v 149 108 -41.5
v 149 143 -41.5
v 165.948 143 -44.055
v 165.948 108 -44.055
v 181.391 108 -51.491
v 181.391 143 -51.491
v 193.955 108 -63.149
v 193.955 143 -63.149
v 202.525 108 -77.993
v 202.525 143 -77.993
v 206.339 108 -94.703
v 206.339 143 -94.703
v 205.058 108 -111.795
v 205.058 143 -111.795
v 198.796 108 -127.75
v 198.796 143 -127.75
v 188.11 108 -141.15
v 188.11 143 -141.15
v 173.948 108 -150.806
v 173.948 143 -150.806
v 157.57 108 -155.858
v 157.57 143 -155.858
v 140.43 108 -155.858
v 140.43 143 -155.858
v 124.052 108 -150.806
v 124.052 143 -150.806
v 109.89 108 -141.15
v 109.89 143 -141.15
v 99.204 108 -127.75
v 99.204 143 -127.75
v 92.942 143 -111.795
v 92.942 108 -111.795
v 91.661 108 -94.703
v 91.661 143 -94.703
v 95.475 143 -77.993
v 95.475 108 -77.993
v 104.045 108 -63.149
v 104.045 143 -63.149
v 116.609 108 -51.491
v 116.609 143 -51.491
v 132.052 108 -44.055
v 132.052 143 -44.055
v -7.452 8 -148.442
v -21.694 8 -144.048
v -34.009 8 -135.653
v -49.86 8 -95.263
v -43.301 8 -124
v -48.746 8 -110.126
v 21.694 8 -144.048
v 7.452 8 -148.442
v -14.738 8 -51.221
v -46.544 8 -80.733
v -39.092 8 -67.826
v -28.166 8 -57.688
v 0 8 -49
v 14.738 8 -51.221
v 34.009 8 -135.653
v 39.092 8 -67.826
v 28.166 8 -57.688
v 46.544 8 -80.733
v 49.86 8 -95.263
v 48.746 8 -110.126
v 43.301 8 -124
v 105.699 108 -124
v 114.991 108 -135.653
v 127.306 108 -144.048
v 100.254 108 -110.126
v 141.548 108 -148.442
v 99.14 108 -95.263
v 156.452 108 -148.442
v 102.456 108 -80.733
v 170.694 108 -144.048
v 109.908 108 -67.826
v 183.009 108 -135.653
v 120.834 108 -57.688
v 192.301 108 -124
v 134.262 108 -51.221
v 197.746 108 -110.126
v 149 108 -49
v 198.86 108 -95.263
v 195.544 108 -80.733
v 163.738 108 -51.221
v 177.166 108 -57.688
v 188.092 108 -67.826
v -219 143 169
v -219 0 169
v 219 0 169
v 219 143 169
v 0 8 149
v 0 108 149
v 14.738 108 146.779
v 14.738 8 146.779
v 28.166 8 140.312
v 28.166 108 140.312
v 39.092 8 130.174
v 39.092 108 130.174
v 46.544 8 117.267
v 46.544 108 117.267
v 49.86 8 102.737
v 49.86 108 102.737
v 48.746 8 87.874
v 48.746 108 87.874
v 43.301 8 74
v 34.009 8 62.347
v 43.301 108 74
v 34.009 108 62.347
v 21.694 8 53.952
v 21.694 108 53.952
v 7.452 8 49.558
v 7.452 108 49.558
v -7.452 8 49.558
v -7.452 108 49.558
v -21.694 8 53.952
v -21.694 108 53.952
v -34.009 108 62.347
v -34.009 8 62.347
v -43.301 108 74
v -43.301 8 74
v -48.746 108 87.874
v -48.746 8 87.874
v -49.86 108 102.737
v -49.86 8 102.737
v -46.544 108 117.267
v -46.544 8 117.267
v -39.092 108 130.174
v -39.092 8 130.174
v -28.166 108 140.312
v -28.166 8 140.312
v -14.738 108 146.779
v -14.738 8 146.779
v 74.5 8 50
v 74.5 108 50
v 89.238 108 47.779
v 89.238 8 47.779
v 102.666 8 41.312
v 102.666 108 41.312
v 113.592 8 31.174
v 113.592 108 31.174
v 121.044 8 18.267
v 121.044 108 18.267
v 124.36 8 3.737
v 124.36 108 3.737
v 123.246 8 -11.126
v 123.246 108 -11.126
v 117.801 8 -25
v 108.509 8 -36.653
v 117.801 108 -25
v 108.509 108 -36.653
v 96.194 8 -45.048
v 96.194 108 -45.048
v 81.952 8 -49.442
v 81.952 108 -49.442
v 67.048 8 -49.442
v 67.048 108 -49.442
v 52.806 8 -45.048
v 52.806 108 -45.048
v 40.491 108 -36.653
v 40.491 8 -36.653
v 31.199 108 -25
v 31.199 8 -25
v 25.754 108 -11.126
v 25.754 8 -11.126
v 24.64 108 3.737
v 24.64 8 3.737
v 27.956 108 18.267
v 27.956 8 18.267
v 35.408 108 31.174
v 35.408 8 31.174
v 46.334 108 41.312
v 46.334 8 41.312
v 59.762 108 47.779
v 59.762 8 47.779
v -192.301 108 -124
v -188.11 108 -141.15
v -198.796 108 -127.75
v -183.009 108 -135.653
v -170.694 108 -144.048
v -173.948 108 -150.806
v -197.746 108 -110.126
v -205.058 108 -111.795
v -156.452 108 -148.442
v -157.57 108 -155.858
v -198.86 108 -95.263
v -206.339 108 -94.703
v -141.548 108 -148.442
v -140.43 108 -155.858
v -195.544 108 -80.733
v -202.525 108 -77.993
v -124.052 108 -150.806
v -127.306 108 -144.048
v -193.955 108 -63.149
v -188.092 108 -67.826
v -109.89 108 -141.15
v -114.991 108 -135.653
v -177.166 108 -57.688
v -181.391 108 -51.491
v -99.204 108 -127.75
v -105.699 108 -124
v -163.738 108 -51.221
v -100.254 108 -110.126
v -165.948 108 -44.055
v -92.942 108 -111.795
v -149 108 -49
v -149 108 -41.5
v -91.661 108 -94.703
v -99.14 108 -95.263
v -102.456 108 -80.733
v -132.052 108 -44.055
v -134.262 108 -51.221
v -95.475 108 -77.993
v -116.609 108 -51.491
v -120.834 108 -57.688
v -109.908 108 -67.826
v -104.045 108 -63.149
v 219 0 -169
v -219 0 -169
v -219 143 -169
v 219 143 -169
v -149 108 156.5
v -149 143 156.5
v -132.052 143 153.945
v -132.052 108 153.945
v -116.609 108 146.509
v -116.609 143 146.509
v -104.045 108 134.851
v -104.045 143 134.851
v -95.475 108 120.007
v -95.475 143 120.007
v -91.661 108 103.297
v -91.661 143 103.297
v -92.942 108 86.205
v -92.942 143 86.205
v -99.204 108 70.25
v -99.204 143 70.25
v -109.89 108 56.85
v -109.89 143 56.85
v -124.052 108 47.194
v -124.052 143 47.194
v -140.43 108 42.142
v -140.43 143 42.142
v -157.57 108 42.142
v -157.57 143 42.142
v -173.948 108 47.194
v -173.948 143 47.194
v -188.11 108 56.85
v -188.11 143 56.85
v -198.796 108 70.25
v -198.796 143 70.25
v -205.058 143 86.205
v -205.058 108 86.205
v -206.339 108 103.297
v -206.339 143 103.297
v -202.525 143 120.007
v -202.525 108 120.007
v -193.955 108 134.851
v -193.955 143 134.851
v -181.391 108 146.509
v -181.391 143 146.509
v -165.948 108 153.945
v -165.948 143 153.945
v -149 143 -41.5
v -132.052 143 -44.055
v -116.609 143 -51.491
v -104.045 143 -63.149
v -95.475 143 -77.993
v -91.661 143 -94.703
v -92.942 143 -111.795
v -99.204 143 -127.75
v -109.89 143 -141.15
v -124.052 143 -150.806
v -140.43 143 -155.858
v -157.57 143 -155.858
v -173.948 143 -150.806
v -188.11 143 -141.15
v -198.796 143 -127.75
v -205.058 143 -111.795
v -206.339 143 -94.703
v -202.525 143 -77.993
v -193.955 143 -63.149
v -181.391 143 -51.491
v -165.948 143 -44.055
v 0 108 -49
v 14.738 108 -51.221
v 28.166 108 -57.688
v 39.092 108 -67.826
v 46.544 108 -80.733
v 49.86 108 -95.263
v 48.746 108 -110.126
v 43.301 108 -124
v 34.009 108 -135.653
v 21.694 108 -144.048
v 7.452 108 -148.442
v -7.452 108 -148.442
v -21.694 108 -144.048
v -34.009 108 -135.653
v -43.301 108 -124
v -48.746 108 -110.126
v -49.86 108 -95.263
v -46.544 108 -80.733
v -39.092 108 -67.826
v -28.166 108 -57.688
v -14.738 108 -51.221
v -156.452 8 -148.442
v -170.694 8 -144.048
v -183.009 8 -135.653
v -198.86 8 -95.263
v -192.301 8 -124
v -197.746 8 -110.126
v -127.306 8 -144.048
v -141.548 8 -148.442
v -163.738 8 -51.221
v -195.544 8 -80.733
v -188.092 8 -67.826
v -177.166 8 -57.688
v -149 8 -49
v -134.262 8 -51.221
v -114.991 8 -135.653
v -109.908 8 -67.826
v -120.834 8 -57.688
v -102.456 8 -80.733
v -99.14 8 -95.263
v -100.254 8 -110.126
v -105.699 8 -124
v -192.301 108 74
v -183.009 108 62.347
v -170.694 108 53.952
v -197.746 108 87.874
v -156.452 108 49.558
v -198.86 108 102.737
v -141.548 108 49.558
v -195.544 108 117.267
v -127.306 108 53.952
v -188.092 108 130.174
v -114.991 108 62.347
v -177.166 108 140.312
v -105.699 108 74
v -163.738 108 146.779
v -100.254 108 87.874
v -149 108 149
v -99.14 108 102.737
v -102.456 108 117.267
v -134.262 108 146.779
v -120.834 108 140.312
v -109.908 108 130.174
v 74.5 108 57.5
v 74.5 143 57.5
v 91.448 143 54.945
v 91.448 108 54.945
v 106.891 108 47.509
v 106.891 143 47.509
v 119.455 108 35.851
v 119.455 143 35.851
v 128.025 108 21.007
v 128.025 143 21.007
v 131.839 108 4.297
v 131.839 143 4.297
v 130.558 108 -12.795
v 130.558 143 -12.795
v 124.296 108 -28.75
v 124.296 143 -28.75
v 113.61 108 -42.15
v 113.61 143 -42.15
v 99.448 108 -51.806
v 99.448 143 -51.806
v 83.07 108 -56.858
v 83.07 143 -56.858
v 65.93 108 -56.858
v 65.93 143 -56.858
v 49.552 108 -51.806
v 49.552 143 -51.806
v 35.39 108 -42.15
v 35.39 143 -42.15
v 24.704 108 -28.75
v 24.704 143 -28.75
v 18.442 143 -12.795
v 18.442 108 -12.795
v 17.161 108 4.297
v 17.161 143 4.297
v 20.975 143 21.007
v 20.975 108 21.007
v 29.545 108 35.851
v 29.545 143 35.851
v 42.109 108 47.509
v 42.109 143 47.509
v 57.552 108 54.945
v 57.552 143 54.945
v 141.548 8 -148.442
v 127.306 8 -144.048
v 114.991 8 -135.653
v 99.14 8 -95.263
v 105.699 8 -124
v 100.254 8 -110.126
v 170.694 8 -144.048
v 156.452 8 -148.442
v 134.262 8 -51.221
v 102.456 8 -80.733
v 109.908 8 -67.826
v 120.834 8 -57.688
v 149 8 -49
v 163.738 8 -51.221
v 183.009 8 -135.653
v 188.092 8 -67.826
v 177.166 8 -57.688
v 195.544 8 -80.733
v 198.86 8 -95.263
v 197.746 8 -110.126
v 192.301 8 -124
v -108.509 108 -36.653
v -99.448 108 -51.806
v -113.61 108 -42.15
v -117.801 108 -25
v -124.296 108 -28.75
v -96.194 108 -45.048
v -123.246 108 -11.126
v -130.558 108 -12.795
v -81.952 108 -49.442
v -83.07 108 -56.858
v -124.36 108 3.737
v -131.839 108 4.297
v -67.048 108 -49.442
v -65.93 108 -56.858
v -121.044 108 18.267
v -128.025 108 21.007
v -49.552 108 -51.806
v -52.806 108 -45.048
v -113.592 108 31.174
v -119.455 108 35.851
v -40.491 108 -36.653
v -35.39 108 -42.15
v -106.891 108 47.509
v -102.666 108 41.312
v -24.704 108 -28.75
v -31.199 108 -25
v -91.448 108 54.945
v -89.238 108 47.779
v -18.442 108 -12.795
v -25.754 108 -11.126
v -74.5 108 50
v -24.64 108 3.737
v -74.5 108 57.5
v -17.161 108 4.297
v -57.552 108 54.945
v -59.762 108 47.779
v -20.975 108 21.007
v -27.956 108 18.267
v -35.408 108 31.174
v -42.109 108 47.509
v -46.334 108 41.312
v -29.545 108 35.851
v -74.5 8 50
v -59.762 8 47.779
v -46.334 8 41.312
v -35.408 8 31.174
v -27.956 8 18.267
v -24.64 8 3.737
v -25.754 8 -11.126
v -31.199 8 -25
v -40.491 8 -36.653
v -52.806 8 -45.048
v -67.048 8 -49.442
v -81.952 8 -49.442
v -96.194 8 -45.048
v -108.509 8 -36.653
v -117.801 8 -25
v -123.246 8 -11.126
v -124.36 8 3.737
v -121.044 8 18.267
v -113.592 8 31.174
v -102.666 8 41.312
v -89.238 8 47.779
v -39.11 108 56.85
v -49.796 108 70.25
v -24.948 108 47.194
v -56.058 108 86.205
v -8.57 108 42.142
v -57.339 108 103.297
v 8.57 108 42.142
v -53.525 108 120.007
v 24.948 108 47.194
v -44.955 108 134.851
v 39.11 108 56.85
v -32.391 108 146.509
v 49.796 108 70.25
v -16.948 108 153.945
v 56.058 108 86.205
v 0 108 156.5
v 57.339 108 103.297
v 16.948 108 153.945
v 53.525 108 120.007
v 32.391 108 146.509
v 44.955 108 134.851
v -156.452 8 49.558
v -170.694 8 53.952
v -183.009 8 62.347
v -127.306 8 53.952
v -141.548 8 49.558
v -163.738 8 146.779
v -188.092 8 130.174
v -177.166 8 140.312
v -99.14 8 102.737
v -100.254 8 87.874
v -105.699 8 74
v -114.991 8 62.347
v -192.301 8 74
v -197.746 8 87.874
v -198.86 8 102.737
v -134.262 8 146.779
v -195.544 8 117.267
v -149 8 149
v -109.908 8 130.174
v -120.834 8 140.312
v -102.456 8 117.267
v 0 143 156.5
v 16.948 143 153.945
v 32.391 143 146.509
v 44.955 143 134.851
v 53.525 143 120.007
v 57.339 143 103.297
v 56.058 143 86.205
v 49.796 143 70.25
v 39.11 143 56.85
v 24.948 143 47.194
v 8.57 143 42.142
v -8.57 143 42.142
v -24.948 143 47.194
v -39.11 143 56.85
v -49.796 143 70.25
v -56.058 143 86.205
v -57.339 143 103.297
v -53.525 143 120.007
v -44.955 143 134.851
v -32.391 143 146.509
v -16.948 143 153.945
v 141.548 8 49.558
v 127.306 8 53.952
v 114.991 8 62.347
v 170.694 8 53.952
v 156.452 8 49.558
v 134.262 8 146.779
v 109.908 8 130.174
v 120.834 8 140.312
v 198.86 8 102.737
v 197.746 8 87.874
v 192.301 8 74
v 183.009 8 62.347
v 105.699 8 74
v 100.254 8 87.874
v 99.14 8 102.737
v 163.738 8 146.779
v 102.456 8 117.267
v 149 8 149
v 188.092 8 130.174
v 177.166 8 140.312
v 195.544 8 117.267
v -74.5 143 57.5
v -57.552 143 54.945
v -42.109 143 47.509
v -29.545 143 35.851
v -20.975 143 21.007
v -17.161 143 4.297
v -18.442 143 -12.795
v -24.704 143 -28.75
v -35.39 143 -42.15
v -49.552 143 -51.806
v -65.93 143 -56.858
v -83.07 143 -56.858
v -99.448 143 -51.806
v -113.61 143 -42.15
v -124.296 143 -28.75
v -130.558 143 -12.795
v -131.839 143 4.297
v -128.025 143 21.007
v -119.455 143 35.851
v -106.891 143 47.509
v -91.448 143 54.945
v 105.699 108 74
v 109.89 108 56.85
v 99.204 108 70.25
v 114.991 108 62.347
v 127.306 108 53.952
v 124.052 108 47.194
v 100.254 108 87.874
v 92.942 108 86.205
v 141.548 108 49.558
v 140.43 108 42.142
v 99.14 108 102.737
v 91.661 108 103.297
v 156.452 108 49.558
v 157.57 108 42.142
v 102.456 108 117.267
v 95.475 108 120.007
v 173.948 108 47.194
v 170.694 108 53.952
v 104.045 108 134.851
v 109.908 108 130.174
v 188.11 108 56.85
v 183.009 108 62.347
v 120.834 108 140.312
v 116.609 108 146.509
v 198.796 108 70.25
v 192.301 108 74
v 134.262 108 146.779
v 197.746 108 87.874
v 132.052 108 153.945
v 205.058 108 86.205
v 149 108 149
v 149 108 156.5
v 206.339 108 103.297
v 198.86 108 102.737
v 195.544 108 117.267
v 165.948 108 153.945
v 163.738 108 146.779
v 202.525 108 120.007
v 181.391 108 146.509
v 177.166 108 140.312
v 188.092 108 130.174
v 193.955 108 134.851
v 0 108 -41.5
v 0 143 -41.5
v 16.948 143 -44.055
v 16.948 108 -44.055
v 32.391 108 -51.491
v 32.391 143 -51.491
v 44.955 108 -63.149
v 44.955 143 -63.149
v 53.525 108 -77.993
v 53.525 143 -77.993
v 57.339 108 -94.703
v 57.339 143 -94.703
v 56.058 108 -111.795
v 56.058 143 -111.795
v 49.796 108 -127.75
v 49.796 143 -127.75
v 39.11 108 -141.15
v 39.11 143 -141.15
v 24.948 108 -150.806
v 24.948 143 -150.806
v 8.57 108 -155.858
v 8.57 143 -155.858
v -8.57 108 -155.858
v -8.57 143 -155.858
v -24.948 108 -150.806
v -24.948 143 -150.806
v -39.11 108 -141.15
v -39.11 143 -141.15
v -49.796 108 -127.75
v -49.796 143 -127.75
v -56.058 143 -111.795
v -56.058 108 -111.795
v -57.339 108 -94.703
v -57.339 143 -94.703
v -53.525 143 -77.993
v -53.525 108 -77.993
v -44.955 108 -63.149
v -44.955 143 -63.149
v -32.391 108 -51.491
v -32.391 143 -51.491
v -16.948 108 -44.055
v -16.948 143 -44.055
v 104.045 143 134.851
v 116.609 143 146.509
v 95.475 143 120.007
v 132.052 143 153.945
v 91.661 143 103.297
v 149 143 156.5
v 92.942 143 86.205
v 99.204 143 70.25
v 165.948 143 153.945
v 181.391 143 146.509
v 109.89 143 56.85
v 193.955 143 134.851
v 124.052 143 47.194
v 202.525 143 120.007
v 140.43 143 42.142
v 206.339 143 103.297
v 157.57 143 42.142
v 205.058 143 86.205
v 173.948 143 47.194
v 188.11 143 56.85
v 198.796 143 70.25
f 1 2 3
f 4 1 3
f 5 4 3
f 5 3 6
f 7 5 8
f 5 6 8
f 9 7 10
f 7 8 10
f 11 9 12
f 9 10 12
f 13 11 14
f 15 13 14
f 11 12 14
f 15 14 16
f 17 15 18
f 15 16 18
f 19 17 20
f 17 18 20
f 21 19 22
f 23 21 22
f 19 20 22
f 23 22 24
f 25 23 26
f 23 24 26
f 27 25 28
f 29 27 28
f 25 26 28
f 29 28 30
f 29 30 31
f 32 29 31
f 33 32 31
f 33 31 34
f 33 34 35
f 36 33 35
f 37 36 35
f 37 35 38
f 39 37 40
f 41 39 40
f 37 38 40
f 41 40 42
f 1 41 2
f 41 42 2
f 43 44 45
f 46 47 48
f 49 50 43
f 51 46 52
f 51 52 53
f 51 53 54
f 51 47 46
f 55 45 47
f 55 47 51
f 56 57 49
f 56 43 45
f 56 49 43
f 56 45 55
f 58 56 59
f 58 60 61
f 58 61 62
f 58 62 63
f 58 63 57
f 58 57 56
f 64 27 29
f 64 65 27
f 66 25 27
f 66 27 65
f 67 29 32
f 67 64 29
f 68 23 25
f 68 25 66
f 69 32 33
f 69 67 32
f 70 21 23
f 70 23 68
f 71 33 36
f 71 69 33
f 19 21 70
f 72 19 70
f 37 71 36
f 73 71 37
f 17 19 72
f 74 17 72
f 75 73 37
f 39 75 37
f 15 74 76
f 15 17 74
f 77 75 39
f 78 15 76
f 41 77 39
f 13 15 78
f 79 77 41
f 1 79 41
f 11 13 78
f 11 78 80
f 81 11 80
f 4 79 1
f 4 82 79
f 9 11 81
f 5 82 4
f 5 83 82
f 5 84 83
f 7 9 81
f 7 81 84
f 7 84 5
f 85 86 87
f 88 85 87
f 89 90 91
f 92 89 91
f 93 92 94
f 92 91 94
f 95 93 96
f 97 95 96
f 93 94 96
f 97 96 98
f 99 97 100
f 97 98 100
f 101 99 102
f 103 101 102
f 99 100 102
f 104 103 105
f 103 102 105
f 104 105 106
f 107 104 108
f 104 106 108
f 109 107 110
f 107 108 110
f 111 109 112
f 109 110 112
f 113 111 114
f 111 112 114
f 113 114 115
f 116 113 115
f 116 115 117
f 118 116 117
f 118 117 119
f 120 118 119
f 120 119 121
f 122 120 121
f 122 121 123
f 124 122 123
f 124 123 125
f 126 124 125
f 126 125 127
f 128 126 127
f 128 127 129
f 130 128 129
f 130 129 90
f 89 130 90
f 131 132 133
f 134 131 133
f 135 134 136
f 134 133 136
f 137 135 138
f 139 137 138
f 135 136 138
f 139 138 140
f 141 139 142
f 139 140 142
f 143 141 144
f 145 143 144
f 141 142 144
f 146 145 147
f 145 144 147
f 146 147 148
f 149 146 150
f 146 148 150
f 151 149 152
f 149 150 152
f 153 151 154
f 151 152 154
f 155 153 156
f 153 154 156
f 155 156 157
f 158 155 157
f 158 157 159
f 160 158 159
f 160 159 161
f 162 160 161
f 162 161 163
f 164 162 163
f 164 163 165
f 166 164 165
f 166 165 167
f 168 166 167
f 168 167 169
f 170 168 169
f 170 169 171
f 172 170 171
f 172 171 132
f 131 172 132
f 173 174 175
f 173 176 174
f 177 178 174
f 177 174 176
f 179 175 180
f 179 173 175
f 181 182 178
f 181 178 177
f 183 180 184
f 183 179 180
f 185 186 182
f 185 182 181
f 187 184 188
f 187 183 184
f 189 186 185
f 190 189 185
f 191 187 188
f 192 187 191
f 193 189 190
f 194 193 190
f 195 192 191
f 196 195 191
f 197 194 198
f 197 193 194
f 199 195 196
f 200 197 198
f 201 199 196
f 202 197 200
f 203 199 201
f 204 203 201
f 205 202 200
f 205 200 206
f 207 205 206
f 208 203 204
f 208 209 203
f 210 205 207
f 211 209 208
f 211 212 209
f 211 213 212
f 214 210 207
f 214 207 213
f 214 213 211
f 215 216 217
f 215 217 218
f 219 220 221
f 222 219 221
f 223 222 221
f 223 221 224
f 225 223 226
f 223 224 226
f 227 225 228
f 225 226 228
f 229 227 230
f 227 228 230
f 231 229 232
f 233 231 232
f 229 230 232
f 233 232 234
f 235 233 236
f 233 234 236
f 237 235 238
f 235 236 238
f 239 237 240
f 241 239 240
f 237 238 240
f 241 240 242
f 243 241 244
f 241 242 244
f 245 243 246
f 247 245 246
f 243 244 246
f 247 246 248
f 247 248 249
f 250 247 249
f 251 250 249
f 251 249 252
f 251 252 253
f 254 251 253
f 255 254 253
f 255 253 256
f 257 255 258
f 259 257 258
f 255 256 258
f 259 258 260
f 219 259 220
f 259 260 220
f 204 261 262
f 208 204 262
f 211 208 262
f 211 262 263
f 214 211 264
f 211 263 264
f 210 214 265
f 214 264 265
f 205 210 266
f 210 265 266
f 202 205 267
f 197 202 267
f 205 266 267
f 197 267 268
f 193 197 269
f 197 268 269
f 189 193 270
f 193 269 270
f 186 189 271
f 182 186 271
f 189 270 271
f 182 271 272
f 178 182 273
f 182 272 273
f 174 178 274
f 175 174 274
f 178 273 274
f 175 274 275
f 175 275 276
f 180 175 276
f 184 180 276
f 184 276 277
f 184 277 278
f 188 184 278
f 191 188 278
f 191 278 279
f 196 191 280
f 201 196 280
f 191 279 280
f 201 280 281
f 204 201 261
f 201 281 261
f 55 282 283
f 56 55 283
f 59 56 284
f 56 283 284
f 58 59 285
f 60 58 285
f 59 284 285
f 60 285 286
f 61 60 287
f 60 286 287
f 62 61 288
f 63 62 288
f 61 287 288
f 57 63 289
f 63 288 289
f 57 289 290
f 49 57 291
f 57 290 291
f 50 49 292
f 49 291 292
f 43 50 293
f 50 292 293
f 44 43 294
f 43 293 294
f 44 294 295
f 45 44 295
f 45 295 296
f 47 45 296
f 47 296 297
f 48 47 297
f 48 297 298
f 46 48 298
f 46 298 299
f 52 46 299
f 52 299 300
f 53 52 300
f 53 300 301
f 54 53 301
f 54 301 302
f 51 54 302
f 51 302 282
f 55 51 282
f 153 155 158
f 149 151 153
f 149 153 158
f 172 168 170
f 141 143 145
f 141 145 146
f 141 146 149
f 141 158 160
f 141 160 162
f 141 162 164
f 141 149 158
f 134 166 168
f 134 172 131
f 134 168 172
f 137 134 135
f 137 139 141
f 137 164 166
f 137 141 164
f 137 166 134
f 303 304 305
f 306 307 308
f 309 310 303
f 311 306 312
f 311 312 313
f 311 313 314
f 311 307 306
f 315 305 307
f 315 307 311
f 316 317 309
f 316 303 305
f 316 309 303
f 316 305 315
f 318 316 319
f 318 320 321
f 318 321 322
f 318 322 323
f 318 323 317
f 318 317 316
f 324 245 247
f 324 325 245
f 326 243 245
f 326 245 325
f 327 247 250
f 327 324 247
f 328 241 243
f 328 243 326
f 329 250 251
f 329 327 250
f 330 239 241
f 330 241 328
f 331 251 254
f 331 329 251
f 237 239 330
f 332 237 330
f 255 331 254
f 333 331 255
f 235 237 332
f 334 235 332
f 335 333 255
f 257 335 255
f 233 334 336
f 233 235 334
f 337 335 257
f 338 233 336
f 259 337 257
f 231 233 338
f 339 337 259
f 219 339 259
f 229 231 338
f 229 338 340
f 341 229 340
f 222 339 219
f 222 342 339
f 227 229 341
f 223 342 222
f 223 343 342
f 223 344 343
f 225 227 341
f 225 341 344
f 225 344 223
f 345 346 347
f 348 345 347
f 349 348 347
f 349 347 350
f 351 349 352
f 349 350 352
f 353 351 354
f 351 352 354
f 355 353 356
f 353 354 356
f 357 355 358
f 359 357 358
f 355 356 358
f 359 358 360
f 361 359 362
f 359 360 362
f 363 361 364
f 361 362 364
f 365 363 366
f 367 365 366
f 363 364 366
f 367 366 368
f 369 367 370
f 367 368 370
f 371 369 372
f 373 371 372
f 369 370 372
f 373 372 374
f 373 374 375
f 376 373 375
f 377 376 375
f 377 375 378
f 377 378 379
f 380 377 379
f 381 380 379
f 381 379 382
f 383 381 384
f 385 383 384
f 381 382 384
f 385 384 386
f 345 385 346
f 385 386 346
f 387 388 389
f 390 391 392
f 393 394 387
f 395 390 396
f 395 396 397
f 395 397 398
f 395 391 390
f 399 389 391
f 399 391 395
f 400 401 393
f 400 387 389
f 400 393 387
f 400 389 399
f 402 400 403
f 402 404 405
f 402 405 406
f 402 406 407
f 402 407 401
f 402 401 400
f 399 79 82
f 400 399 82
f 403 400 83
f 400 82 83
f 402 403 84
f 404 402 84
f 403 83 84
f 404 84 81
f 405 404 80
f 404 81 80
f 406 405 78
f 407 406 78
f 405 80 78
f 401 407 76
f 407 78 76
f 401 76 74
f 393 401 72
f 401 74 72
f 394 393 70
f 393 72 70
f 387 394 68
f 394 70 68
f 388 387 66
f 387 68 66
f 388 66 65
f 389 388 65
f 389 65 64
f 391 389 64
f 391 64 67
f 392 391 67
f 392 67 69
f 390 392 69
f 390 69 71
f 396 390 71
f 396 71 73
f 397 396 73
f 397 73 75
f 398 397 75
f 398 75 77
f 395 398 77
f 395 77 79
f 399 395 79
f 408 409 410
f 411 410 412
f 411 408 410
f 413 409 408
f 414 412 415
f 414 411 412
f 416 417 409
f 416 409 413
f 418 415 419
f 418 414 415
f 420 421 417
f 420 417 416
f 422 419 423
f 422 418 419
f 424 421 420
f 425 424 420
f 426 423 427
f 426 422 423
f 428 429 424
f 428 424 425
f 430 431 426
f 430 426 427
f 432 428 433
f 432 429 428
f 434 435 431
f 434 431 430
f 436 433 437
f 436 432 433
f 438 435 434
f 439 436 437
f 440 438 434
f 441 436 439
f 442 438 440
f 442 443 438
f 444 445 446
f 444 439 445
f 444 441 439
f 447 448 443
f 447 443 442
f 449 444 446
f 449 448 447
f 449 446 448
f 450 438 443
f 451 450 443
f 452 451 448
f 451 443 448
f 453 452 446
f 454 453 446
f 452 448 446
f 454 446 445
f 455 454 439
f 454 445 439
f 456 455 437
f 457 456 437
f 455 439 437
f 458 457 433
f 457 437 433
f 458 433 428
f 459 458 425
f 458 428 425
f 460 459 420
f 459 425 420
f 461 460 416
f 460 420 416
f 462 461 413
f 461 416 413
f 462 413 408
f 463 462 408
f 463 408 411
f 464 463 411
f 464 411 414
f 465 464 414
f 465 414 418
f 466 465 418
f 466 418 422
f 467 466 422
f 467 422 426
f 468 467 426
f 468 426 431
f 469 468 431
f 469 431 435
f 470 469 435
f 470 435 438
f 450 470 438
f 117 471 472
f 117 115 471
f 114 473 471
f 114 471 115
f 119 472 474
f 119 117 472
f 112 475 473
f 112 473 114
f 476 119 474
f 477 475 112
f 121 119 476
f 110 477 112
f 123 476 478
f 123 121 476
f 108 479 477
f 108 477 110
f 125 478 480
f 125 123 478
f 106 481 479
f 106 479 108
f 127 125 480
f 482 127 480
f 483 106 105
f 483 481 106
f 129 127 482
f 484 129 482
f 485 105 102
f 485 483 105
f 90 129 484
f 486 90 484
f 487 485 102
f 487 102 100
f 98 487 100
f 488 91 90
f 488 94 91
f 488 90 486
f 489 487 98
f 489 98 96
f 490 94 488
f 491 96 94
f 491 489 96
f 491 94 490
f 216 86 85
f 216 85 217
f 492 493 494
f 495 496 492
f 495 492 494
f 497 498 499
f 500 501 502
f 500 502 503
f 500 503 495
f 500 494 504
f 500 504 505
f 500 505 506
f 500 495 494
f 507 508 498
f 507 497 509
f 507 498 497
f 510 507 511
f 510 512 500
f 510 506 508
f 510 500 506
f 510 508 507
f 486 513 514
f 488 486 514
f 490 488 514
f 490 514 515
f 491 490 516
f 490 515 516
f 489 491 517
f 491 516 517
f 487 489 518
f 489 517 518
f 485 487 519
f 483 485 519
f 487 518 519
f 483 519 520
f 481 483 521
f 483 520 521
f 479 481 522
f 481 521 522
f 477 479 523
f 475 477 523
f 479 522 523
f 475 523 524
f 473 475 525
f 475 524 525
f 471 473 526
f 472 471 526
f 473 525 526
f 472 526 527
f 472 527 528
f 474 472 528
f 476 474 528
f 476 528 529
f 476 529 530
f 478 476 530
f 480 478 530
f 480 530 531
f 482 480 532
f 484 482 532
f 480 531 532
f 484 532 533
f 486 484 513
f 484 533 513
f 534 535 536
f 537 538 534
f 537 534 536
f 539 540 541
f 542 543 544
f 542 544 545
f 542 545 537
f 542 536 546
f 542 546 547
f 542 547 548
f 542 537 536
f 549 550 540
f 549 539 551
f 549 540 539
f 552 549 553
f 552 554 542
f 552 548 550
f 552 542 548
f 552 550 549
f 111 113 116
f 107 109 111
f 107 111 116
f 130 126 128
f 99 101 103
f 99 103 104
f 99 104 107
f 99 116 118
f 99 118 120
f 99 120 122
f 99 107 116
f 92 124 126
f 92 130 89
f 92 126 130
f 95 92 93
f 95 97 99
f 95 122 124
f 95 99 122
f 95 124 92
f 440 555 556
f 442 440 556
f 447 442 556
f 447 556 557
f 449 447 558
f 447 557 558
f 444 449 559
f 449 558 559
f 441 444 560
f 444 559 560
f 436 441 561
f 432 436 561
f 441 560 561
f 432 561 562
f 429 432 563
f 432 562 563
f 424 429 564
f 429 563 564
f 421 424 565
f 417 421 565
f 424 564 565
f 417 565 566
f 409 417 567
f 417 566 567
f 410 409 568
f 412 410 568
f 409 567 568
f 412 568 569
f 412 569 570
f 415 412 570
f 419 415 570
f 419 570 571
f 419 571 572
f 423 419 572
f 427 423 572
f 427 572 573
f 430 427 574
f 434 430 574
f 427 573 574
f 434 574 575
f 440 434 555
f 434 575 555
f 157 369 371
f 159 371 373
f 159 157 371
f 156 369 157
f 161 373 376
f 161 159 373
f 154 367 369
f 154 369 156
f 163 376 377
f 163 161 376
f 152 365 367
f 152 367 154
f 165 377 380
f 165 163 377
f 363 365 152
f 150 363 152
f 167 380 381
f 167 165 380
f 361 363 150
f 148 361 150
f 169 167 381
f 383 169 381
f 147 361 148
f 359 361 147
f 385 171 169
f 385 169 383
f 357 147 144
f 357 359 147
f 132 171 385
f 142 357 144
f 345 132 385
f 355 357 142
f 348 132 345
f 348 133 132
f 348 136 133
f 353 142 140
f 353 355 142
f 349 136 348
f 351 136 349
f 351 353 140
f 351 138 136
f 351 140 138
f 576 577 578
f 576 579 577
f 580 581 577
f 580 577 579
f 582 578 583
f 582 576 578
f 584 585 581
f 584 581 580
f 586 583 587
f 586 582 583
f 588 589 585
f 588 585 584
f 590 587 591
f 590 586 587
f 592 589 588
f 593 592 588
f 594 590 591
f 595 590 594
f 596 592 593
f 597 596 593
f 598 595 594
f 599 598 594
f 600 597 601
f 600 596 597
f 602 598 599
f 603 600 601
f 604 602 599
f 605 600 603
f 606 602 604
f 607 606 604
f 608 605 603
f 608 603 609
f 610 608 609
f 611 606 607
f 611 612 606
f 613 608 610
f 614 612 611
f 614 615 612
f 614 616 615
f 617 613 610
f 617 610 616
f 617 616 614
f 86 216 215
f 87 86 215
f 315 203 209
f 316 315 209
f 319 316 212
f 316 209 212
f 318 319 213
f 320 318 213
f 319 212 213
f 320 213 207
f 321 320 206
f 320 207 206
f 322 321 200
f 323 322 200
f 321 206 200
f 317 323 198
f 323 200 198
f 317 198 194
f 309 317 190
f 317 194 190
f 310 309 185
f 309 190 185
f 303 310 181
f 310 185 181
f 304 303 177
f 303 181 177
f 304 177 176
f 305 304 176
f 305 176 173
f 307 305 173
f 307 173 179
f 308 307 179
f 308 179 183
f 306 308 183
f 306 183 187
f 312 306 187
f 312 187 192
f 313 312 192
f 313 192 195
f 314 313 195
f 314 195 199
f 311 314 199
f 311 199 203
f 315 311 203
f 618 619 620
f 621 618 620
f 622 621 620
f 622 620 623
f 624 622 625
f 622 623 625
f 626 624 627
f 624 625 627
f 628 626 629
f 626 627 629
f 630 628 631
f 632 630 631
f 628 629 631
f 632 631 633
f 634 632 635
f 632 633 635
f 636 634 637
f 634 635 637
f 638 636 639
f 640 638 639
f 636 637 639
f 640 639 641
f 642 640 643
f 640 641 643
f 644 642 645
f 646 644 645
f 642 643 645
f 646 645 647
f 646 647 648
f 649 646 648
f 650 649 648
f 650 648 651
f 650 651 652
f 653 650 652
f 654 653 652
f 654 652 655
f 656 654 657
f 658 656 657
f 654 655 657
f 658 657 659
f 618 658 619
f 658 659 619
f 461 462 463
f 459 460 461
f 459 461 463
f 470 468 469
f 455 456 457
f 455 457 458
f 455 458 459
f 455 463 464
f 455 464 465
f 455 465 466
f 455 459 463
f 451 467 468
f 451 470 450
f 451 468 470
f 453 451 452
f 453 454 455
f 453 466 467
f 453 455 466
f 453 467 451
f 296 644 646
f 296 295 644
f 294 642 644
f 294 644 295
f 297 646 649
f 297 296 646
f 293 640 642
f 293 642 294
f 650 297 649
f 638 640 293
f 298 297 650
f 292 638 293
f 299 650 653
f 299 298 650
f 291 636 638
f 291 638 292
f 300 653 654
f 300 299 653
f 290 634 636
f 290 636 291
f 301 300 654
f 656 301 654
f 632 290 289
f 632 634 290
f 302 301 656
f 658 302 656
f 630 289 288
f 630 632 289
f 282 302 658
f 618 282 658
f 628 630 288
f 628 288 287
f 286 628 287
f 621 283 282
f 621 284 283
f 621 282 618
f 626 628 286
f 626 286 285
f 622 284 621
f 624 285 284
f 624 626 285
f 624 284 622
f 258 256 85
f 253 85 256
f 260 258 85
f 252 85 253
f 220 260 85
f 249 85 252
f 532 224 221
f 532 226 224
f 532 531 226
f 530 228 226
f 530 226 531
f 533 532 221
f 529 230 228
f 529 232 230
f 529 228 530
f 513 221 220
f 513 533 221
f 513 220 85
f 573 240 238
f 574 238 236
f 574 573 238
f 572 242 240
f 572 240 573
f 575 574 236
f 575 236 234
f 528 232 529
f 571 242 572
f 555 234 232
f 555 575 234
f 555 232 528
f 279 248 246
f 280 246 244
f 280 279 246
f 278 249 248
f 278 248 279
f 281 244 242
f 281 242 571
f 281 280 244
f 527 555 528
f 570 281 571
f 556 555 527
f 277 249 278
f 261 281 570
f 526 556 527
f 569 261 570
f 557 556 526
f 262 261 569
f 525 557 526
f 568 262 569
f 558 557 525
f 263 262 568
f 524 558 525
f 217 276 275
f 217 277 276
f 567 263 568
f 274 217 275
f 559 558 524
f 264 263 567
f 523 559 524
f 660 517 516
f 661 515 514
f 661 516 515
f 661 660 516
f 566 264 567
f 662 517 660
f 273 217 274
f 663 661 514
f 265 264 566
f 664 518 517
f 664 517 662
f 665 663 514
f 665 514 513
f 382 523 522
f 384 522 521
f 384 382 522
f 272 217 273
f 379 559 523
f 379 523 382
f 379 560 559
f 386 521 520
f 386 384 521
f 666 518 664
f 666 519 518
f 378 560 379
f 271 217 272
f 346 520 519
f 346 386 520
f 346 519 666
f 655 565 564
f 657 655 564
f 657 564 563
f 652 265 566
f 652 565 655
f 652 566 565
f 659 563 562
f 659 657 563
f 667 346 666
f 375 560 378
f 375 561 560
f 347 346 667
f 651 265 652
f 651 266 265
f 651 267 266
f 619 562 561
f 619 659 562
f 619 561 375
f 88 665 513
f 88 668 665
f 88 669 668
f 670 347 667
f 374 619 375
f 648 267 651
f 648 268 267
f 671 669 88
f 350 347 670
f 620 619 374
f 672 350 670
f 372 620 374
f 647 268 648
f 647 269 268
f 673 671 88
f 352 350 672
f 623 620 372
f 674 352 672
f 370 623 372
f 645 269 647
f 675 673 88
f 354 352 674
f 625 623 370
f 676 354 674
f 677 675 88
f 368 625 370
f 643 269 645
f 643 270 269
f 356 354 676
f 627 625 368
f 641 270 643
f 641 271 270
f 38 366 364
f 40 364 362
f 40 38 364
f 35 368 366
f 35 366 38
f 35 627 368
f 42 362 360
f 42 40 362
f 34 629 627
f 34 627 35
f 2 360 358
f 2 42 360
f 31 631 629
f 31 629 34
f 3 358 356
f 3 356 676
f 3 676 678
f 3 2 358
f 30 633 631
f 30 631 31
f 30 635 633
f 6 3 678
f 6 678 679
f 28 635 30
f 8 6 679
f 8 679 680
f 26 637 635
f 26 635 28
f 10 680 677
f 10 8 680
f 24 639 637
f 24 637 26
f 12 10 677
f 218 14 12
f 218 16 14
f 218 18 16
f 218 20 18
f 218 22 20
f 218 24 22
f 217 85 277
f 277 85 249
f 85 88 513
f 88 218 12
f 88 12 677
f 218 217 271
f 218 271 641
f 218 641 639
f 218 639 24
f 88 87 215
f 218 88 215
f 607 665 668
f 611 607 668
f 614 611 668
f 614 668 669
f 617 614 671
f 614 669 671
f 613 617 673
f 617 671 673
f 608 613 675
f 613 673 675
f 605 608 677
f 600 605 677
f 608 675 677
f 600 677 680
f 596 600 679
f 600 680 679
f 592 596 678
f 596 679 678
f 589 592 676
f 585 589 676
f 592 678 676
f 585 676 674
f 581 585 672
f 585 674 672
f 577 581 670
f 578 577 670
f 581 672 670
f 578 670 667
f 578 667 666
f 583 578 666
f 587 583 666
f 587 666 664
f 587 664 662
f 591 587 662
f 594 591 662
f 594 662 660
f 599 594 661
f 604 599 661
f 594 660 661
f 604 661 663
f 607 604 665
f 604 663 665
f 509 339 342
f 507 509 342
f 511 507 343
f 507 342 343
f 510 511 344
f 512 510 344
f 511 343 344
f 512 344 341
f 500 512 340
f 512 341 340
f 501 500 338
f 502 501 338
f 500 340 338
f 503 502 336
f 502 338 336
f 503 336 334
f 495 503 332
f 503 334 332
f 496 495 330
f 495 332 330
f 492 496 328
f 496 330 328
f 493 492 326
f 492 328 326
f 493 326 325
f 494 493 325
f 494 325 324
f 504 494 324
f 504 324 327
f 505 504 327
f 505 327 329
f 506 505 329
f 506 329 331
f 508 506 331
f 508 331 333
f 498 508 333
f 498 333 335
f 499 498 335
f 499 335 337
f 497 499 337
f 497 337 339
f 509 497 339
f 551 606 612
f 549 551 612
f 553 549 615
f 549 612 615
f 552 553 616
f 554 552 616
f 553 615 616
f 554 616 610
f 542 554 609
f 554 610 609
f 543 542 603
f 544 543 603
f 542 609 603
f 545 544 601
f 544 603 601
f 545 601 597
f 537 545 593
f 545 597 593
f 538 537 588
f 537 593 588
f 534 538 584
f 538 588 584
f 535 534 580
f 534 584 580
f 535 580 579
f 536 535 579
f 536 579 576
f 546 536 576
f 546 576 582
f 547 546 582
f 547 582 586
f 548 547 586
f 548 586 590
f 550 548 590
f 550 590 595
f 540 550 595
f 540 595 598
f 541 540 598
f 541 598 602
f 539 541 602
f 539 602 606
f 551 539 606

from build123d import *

# Parameters (mm, degrees)
SKETCH_1_W          = 438
SKETCH_1_H          = 338
EXTRUDE_1_DEPTH     = 143
SKETCH_2_R          = 50
CUT_EXTRUDE_1_DEPTH = 135
SKETCH_4_R          = 57.5
CUT_EXTRUDE_2_DEPTH = 35


with BuildPart() as part:
    # Эскиз1 → Бобышка-Вытянуть1 (new body)
    with BuildSketch(Plane(origin=(0, 0, 0), x_dir=(1, 0, 0), z_dir=(0, 1, 0))):
        Rectangle(SKETCH_1_W, SKETCH_1_H)
    extrude(amount=EXTRUDE_1_DEPTH)

    # Эскиз2 → Вырез-Вытянуть1 (cut)
    with BuildSketch(Plane(origin=(0, 143, 0), x_dir=(1, 0, 0), z_dir=(0, 1, 0))):
        with Locations(Location((-149, 99, 0), (0, 0, 270))):
            Circle(SKETCH_2_R)
        with Locations(Location((0, 99, 0), (0, 0, 270))):
            Circle(SKETCH_2_R)
        with Locations(Location((0, -99, 0), (0, 0, 270))):
            Circle(SKETCH_2_R)
        with Locations(Location((-149, -99, 0), (0, 0, 270))):
            Circle(SKETCH_2_R)
        with Locations(Location((-74.5, 0, 0), (0, 0, 270))):
            Circle(SKETCH_2_R)
        with Locations(Location((149, 99, 0), (0, 0, 270))):
            Circle(SKETCH_2_R)
        with Locations(Location((149, -99, 0), (0, 0, 270))):
            Circle(SKETCH_2_R)
        with Locations(Location((74.5, 0, 0), (0, 0, 270))):
            Circle(SKETCH_2_R)
    extrude(amount=-CUT_EXTRUDE_1_DEPTH, mode=Mode.SUBTRACT)

    # Эскиз4 → Вырез-Вытянуть2 (cut)
    with BuildSketch(Plane(origin=(0, 143, 0), x_dir=(1, 0, 0), z_dir=(0, 1, 0))):
        with Locations(Location((-149, 99, 0), (0, 0, 270))):
            Circle(SKETCH_4_R)
        with Locations(Location((0, 99, 0), (0, 0, 270))):
            Circle(SKETCH_4_R)
        with Locations(Location((0, -99, 0), (0, 0, 270))):
            Circle(SKETCH_4_R)
        with Locations(Location((-149, -99, 0), (0, 0, 270))):
            Circle(SKETCH_4_R)
        with Locations(Location((-74.5, 0, 0), (0, 0, 270))):
            Circle(SKETCH_4_R)
        with Locations(Location((149, 99, 0), (0, 0, 270))):
            Circle(SKETCH_4_R)
        with Locations(Location((149, -99, 0), (0, 0, 270))):
            Circle(SKETCH_4_R)
        with Locations(Location((74.5, 0, 0), (0, 0, 270))):
            Circle(SKETCH_4_R)
    extrude(amount=-CUT_EXTRUDE_2_DEPTH, mode=Mode.SUBTRACT)


solid = part.part
